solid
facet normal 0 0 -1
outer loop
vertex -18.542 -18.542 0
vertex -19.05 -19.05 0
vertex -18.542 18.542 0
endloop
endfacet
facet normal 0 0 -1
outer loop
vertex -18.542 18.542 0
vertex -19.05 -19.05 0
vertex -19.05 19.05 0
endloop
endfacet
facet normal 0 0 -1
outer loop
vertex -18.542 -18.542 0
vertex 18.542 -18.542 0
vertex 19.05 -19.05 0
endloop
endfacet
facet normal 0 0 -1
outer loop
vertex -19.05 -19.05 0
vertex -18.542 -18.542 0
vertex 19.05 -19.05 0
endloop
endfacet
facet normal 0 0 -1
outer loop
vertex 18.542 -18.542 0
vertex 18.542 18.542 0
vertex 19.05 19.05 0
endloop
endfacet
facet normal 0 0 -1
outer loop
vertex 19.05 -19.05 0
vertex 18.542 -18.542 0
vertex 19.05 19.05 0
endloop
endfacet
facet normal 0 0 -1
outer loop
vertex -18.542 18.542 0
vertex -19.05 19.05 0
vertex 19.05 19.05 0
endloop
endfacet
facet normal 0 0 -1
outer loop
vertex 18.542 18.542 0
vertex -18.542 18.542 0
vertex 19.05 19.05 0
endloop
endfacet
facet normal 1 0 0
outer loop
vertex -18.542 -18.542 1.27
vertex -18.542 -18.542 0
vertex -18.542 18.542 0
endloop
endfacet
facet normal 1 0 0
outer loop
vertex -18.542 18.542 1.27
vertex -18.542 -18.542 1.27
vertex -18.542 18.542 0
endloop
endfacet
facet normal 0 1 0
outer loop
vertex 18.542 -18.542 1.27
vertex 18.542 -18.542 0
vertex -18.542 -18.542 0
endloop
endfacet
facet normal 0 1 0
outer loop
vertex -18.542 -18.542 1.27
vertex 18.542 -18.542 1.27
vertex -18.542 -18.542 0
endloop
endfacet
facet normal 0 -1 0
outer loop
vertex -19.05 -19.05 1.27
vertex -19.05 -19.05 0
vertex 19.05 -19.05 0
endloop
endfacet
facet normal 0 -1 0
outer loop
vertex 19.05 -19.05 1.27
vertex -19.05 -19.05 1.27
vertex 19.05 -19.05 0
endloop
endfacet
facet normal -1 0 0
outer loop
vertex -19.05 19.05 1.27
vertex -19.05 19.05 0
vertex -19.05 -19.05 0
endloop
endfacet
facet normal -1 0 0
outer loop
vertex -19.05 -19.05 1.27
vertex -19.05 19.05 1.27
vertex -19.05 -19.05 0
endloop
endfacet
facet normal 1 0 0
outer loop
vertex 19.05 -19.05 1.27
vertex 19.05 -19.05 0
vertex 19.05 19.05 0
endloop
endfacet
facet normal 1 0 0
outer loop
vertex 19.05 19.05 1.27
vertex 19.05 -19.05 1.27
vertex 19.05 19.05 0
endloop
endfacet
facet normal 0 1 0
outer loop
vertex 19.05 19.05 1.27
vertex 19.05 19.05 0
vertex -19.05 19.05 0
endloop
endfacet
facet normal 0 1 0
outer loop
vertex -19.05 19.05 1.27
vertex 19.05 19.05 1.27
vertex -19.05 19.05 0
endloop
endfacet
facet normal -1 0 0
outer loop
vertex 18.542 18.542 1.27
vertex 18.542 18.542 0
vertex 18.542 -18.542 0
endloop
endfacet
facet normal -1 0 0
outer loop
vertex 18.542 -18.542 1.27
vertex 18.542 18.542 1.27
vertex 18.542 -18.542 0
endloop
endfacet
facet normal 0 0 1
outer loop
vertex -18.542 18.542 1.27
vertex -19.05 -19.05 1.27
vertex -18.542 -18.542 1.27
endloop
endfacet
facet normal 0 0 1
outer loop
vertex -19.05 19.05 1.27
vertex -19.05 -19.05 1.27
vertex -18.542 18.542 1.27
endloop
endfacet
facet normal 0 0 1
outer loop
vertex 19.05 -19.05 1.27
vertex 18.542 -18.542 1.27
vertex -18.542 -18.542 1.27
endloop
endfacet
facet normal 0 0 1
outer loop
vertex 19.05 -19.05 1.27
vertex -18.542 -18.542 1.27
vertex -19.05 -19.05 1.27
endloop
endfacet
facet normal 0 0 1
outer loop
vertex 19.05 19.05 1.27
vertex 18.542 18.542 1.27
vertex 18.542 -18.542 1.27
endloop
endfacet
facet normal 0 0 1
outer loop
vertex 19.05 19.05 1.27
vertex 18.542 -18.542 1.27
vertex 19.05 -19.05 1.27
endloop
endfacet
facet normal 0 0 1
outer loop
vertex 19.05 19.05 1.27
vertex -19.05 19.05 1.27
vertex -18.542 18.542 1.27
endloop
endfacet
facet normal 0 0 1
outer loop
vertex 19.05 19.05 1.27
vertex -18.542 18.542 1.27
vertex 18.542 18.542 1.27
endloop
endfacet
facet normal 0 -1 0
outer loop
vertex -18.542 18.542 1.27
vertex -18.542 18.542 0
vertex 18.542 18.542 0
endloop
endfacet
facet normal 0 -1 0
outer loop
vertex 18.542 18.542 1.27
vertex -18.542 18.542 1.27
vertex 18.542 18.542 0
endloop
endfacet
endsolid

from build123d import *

# Parameters (mm, degrees)
F0_W     = 0.508
F0_H     = 0.508
F1_DEPTH = 1.27
F2_R     = 1.5875
F3_DEPTH = 25.4


with BuildPart() as f1:
    # F0 (on Top) → F1 (new body)
    with BuildSketch(Plane.XY):
        with Locations((18.796, -18.796)):
            Rectangle(F0_W, F0_H)
        with Locations((18.288, -18.796)):
            Rectangle(F0_W, F0_H)
        with Locations((18.796, -18.288)):
            Rectangle(F0_W, F0_H)
        with Locations((17.78, -18.796)):
            Rectangle(F0_W, F0_H)
        with Locations((18.796, -17.78)):
            Rectangle(F0_W, F0_H)
        with Locations((17.272, -18.796)):
            Rectangle(F0_W, F0_H)
        with Locations((18.796, -17.272)):
            Rectangle(F0_W, F0_H)
        with Locations((16.764, -18.796)):
            Rectangle(F0_W, F0_H)
        with Locations((18.796, -16.764)):
            Rectangle(F0_W, F0_H)
        with Locations((16.256, -18.796)):
            Rectangle(F0_W, F0_H)
        with Locations((18.796, -16.256)):
            Rectangle(F0_W, F0_H)
        with Locations((15.748, -18.796)):
            Rectangle(F0_W, F0_H)
        with Locations((18.796, -15.748)):
            Rectangle(F0_W, F0_H)
        with Locations((15.24, -18.796)):
            Rectangle(F0_W, F0_H)
        with Locations((18.796, -15.24)):
            Rectangle(F0_W, F0_H)
        with Locations((14.732, -18.796)):
            Rectangle(F0_W, F0_H)
        with Locations((18.796, -14.732)):
            Rectangle(F0_W, F0_H)
        with Locations((14.224, -18.796)):
            Rectangle(F0_W, F0_H)
        with Locations((18.796, -14.224)):
            Rectangle(F0_W, F0_H)
        with Locations((13.716, -18.796)):
            Rectangle(F0_W, F0_H)
        with Locations((18.796, -13.716)):
            Rectangle(F0_W, F0_H)
        with Locations((13.208, -18.796)):
            Rectangle(F0_W, F0_H)
        with Locations((18.796, -13.208)):
            Rectangle(F0_W, F0_H)
        with Locations((12.7, -18.796)):
            Rectangle(F0_W, F0_H)
        with Locations((18.796, -12.7)):
            Rectangle(F0_W, F0_H)
        with Locations((12.192, -18.796)):
            Rectangle(F0_W, F0_H)
        with Locations((18.796, -12.192)):
            Rectangle(F0_W, F0_H)
        with Locations((11.684, -18.796)):
            Rectangle(F0_W, F0_H)
        with Locations((18.796, -11.684)):
            Rectangle(F0_W, F0_H)
        with Locations((11.176, -18.796)):
            Rectangle(F0_W, F0_H)
        with Locations((18.796, -11.176)):
            Rectangle(F0_W, F0_H)
        with Locations((10.668, -18.796)):
            Rectangle(F0_W, F0_H)
        with Locations((18.796, -10.668)):
            Rectangle(F0_W, F0_H)
        with Locations((10.16, -18.796)):
            Rectangle(F0_W, F0_H)
        with Locations((18.796, -10.16)):
            Rectangle(F0_W, F0_H)
        with Locations((9.652, -18.796)):
            Rectangle(F0_W, F0_H)
        with Locations((18.796, -9.652)):
            Rectangle(F0_W, F0_H)
        with Locations((9.144, -18.796)):
            Rectangle(F0_W, F0_H)
        with Locations((18.796, -9.144)):
            Rectangle(F0_W, F0_H)
        with Locations((8.636, -18.796)):
            Rectangle(F0_W, F0_H)
        with Locations((18.796, -8.636)):
            Rectangle(F0_W, F0_H)
        with Locations((8.128, -18.796)):
            Rectangle(F0_W, F0_H)
        with Locations((18.796, -8.128)):
            Rectangle(F0_W, F0_H)
        with Locations((7.62, -18.796)):
            Rectangle(F0_W, F0_H)
        with Locations((18.796, -7.62)):
            Rectangle(F0_W, F0_H)
        with Locations((7.112, -18.796)):
            Rectangle(F0_W, F0_H)
        with Locations((18.796, -7.112)):
            Rectangle(F0_W, F0_H)
        with Locations((6.604, -18.796)):
            Rectangle(F0_W, F0_H)
        with Locations((18.796, -6.604)):
            Rectangle(F0_W, F0_H)
        with Locations((6.096, -18.796)):
            Rectangle(F0_W, F0_H)
        with Locations((18.796, -6.096)):
            Rectangle(F0_W, F0_H)
        with Locations((5.588, -18.796)):
            Rectangle(F0_W, F0_H)
        with Locations((18.796, -5.588)):
            Rectangle(F0_W, F0_H)
        with Locations((5.08, -18.796)):
            Rectangle(F0_W, F0_H)
        with Locations((18.796, -5.08)):
            Rectangle(F0_W, F0_H)
        with Locations((4.572, -18.796)):
            Rectangle(F0_W, F0_H)
        with Locations((18.796, -4.572)):
            Rectangle(F0_W, F0_H)
        with Locations((4.064, -18.796)):
            Rectangle(F0_W, F0_H)
        with Locations((18.796, -4.064)):
            Rectangle(F0_W, F0_H)
        with Locations((3.556, -18.796)):
            Rectangle(F0_W, F0_H)
        with Locations((18.796, -3.556)):
            Rectangle(F0_W, F0_H)
        with Locations((3.048, -18.796)):
            Rectangle(F0_W, F0_H)
        with Locations((18.796, -3.048)):
            Rectangle(F0_W, F0_H)
        with Locations((2.54, -18.796)):
            Rectangle(F0_W, F0_H)
        with Locations((18.796, -2.54)):
            Rectangle(F0_W, F0_H)
        with Locations((2.032, -18.796)):
            Rectangle(F0_W, F0_H)
        with Locations((18.796, -2.032)):
            Rectangle(F0_W, F0_H)
        with Locations((1.524, -18.796)):
            Rectangle(F0_W, F0_H)
        with Locations((18.796, -1.524)):
            Rectangle(F0_W, F0_H)
        with Locations((1.016, -18.796)):
            Rectangle(F0_W, F0_H)
        with Locations((18.796, -1.016)):
            Rectangle(F0_W, F0_H)
        with Locations((0.508, -18.796)):
            Rectangle(F0_W, F0_H)
        with Locations((18.796, -0.508)):
            Rectangle(F0_W, F0_H)
        with Locations((0, -18.796)):
            Rectangle(F0_W, F0_H)
        with Locations((18.796, 0)):
            Rectangle(F0_W, F0_H)
        with Locations((-0.508, -18.796)):
            Rectangle(F0_W, F0_H)
        with Locations((18.796, 0.508)):
            Rectangle(F0_W, F0_H)
        with Locations((-1.016, -18.796)):
            Rectangle(F0_W, F0_H)
        with Locations((18.796, 1.016)):
            Rectangle(F0_W, F0_H)
        with Locations((-1.524, -18.796)):
            Rectangle(F0_W, F0_H)
        with Locations((18.796, 1.524)):
            Rectangle(F0_W, F0_H)
        with Locations((-2.032, -18.796)):
            Rectangle(F0_W, F0_H)
        with Locations((18.796, 2.032)):
            Rectangle(F0_W, F0_H)
        with Locations((-2.54, -18.796)):
            Rectangle(F0_W, F0_H)
        with Locations((18.796, 2.54)):
            Rectangle(F0_W, F0_H)
        with Locations((-3.048, -18.796)):
            Rectangle(F0_W, F0_H)
        with Locations((18.796, 3.048)):
            Rectangle(F0_W, F0_H)
        with Locations((-3.556, -18.796)):
            Rectangle(F0_W, F0_H)
        with Locations((18.796, 3.556)):
            Rectangle(F0_W, F0_H)
        with Locations((-4.064, -18.796)):
            Rectangle(F0_W, F0_H)
        with Locations((18.796, 4.064)):
            Rectangle(F0_W, F0_H)
        with Locations((-4.572, -18.796)):
            Rectangle(F0_W, F0_H)
        with Locations((18.796, 4.572)):
            Rectangle(F0_W, F0_H)
        with Locations((-5.08, -18.796)):
            Rectangle(F0_W, F0_H)
        with Locations((18.796, 5.08)):
            Rectangle(F0_W, F0_H)
        with Locations((-5.588, -18.796)):
            Rectangle(F0_W, F0_H)
        with Locations((18.796, 5.588)):
            Rectangle(F0_W, F0_H)
        with Locations((-6.096, -18.796)):
            Rectangle(F0_W, F0_H)
        with Locations((18.796, 6.096)):
            Rectangle(F0_W, F0_H)
        with Locations((-6.604, -18.796)):
            Rectangle(F0_W, F0_H)
        with Locations((18.796, 6.604)):
            Rectangle(F0_W, F0_H)
        with Locations((-7.112, -18.796)):
            Rectangle(F0_W, F0_H)
        with Locations((18.796, 7.112)):
            Rectangle(F0_W, F0_H)
        with Locations((-7.62, -18.796)):
            Rectangle(F0_W, F0_H)
        with Locations((18.796, 7.62)):
            Rectangle(F0_W, F0_H)
        with Locations((-8.128, -18.796)):
            Rectangle(F0_W, F0_H)
        with Locations((18.796, 8.128)):
            Rectangle(F0_W, F0_H)
        with Locations((-8.636, -18.796)):
            Rectangle(F0_W, F0_H)
        with Locations((18.796, 8.636)):
            Rectangle(F0_W, F0_H)
        with Locations((-9.144, -18.796)):
            Rectangle(F0_W, F0_H)
        with Locations((18.796, 9.144)):
            Rectangle(F0_W, F0_H)
        with Locations((-9.652, -18.796)):
            Rectangle(F0_W, F0_H)
        with Locations((18.796, 9.652)):
            Rectangle(F0_W, F0_H)
        with Locations((-10.16, -18.796)):
            Rectangle(F0_W, F0_H)
        with Locations((18.796, 10.16)):
            Rectangle(F0_W, F0_H)
        with Locations((-10.668, -18.796)):
            Rectangle(F0_W, F0_H)
        with Locations((18.796, 10.668)):
            Rectangle(F0_W, F0_H)
        with Locations((-11.176, -18.796)):
            Rectangle(F0_W, F0_H)
        with Locations((18.796, 11.176)):
            Rectangle(F0_W, F0_H)
        with Locations((-11.684, -18.796)):
            Rectangle(F0_W, F0_H)
        with Locations((18.796, 11.684)):
            Rectangle(F0_W, F0_H)
        with Locations((-12.192, -18.796)):
            Rectangle(F0_W, F0_H)
        with Locations((18.796, 12.192)):
            Rectangle(F0_W, F0_H)
        with Locations((-12.7, -18.796)):
            Rectangle(F0_W, F0_H)
        with Locations((18.796, 12.7)):
            Rectangle(F0_W, F0_H)
        with Locations((-13.208, -18.796)):
            Rectangle(F0_W, F0_H)
        with Locations((18.796, 13.208)):
            Rectangle(F0_W, F0_H)
        with Locations((-13.716, -18.796)):
            Rectangle(F0_W, F0_H)
        with Locations((18.796, 13.716)):
            Rectangle(F0_W, F0_H)
        with Locations((-14.224, -18.796)):
            Rectangle(F0_W, F0_H)
        with Locations((18.796, 14.224)):
            Rectangle(F0_W, F0_H)
        with Locations((-14.732, -18.796)):
            Rectangle(F0_W, F0_H)
        with Locations((18.796, 14.732)):
            Rectangle(F0_W, F0_H)
        with Locations((-15.24, -18.796)):
            Rectangle(F0_W, F0_H)
        with Locations((18.796, 15.24)):
            Rectangle(F0_W, F0_H)
        with Locations((-15.748, -18.796)):
            Rectangle(F0_W, F0_H)
        with Locations((18.796, 15.748)):
            Rectangle(F0_W, F0_H)
        with Locations((-16.256, -18.796)):
            Rectangle(F0_W, F0_H)
        with Locations((18.796, 16.256)):
            Rectangle(F0_W, F0_H)
        with Locations((-16.764, -18.796)):
            Rectangle(F0_W, F0_H)
        with Locations((18.796, 16.764)):
            Rectangle(F0_W, F0_H)
        with Locations((-17.272, -18.796)):
            Rectangle(F0_W, F0_H)
        with Locations((18.796, 17.272)):
            Rectangle(F0_W, F0_H)
        with Locations((-17.78, -18.796)):
            Rectangle(F0_W, F0_H)
        with Locations((18.796, 17.78)):
            Rectangle(F0_W, F0_H)
        with Locations((-18.288, -18.796)):
            Rectangle(F0_W, F0_H)
        with Locations((18.796, 18.288)):
            Rectangle(F0_W, F0_H)
        with Locations((-18.796, -18.796)):
            Rectangle(F0_W, F0_H)
        with Locations((18.796, 18.796)):
            Rectangle(F0_W, F0_H)
        with Locations((-18.796, -18.288)):
            Rectangle(F0_W, F0_H)
        with Locations((18.288, 18.796)):
            Rectangle(F0_W, F0_H)
        with Locations((-18.796, -17.78)):
            Rectangle(F0_W, F0_H)
        with Locations((17.78, 18.796)):
            Rectangle(F0_W, F0_H)
        with Locations((-18.796, -17.272)):
            Rectangle(F0_W, F0_H)
        with Locations((17.272, 18.796)):
            Rectangle(F0_W, F0_H)
        with Locations((-18.796, -16.764)):
            Rectangle(F0_W, F0_H)
        with Locations((16.764, 18.796)):
            Rectangle(F0_W, F0_H)
        with Locations((-18.796, -16.256)):
            Rectangle(F0_W, F0_H)
        with Locations((16.256, 18.796)):
            Rectangle(F0_W, F0_H)
        with Locations((-18.796, -15.748)):
            Rectangle(F0_W, F0_H)
        with Locations((15.748, 18.796)):
            Rectangle(F0_W, F0_H)
        with Locations((-18.796, -15.24)):
            Rectangle(F0_W, F0_H)
        with Locations((15.24, 18.796)):
            Rectangle(F0_W, F0_H)
        with Locations((-18.796, -14.732)):
            Rectangle(F0_W, F0_H)
        with Locations((14.732, 18.796)):
            Rectangle(F0_W, F0_H)
        with Locations((-18.796, -14.224)):
            Rectangle(F0_W, F0_H)
        with Locations((14.224, 18.796)):
            Rectangle(F0_W, F0_H)
        with Locations((-18.796, -13.716)):
            Rectangle(F0_W, F0_H)
        with Locations((13.716, 18.796)):
            Rectangle(F0_W, F0_H)
        with Locations((-18.796, -13.208)):
            Rectangle(F0_W, F0_H)
        with Locations((13.208, 18.796)):
            Rectangle(F0_W, F0_H)
        with Locations((-18.796, -12.7)):
            Rectangle(F0_W, F0_H)
        with Locations((12.7, 18.796)):
            Rectangle(F0_W, F0_H)
        with Locations((-18.796, -12.192)):
            Rectangle(F0_W, F0_H)
        with Locations((12.192, 18.796)):
            Rectangle(F0_W, F0_H)
        with Locations((-18.796, -11.684)):
            Rectangle(F0_W, F0_H)
        with Locations((11.684, 18.796)):
            Rectangle(F0_W, F0_H)
        with Locations((-18.796, -11.176)):
            Rectangle(F0_W, F0_H)
        with Locations((11.176, 18.796)):
            Rectangle(F0_W, F0_H)
        with Locations((-18.796, -10.668)):
            Rectangle(F0_W, F0_H)
        with Locations((10.668, 18.796)):
            Rectangle(F0_W, F0_H)
        with Locations((-18.796, -10.16)):
            Rectangle(F0_W, F0_H)
        with Locations((10.16, 18.796)):
            Rectangle(F0_W, F0_H)
        with Locations((-18.796, -9.652)):
            Rectangle(F0_W, F0_H)
        with Locations((9.652, 18.796)):
            Rectangle(F0_W, F0_H)
        with Locations((-18.796, -9.144)):
            Rectangle(F0_W, F0_H)
        with Locations((9.144, 18.796)):
            Rectangle(F0_W, F0_H)
        with Locations((-18.796, -8.636)):
            Rectangle(F0_W, F0_H)
        with Locations((8.636, 18.796)):
            Rectangle(F0_W, F0_H)
        with Locations((-18.796, -8.128)):
            Rectangle(F0_W, F0_H)
        with Locations((8.128, 18.796)):
            Rectangle(F0_W, F0_H)
        with Locations((-18.796, -7.62)):
            Rectangle(F0_W, F0_H)
        with Locations((7.62, 18.796)):
            Rectangle(F0_W, F0_H)
        with Locations((-18.796, -7.112)):
            Rectangle(F0_W, F0_H)
        with Locations((7.112, 18.796)):
            Rectangle(F0_W, F0_H)
        with Locations((-18.796, -6.604)):
            Rectangle(F0_W, F0_H)
        with Locations((6.604, 18.796)):
            Rectangle(F0_W, F0_H)
        with Locations((-18.796, -6.096)):
            Rectangle(F0_W, F0_H)
        with Locations((6.096, 18.796)):
            Rectangle(F0_W, F0_H)
        with Locations((-18.796, -5.588)):
            Rectangle(F0_W, F0_H)
        with Locations((5.588, 18.796)):
            Rectangle(F0_W, F0_H)
        with Locations((-18.796, -5.08)):
            Rectangle(F0_W, F0_H)
        with Locations((5.08, 18.796)):
            Rectangle(F0_W, F0_H)
        with Locations((-18.796, -4.572)):
            Rectangle(F0_W, F0_H)
        with Locations((4.572, 18.796)):
            Rectangle(F0_W, F0_H)
        with Locations((-18.796, -4.064)):
            Rectangle(F0_W, F0_H)
        with Locations((4.064, 18.796)):
            Rectangle(F0_W, F0_H)
        with Locations((-18.796, -3.556)):
            Rectangle(F0_W, F0_H)
        with Locations((3.556, 18.796)):
            Rectangle(F0_W, F0_H)
        with Locations((-18.796, -3.048)):
            Rectangle(F0_W, F0_H)
        with Locations((3.048, 18.796)):
            Rectangle(F0_W, F0_H)
        with Locations((-18.796, -2.54)):
            Rectangle(F0_W, F0_H)
        with Locations((2.54, 18.796)):
            Rectangle(F0_W, F0_H)
        with Locations((-18.796, -2.032)):
            Rectangle(F0_W, F0_H)
        with Locations((2.032, 18.796)):
            Rectangle(F0_W, F0_H)
        with Locations((-18.796, -1.524)):
            Rectangle(F0_W, F0_H)
        with Locations((1.524, 18.796)):
            Rectangle(F0_W, F0_H)
        with Locations((-18.796, -1.016)):
            Rectangle(F0_W, F0_H)
        with Locations((1.016, 18.796)):
            Rectangle(F0_W, F0_H)
        with Locations((-18.796, -0.508)):
            Rectangle(F0_W, F0_H)
        with Locations((0.508, 18.796)):
            Rectangle(F0_W, F0_H)
        with Locations((-18.796, 0)):
            Rectangle(F0_W, F0_H)
        with Locations((0, 18.796)):
            Rectangle(F0_W, F0_H)
        with Locations((-18.796, 0.508)):
            Rectangle(F0_W, F0_H)
        with Locations((-0.508, 18.796)):
            Rectangle(F0_W, F0_H)
        with Locations((-18.796, 1.016)):
            Rectangle(F0_W, F0_H)
        with Locations((-1.016, 18.796)):
            Rectangle(F0_W, F0_H)
        with Locations((-18.796, 1.524)):
            Rectangle(F0_W, F0_H)
        with Locations((-1.524, 18.796)):
            Rectangle(F0_W, F0_H)
        with Locations((-18.796, 2.032)):
            Rectangle(F0_W, F0_H)
        with Locations((-2.032, 18.796)):
            Rectangle(F0_W, F0_H)
        with Locations((-18.796, 2.54)):
            Rectangle(F0_W, F0_H)
        with Locations((-2.54, 18.796)):
            Rectangle(F0_W, F0_H)
        with Locations((-18.796, 3.048)):
            Rectangle(F0_W, F0_H)
        with Locations((-3.048, 18.796)):
            Rectangle(F0_W, F0_H)
        with Locations((-18.796, 3.556)):
            Rectangle(F0_W, F0_H)
        with Locations((-3.556, 18.796)):
            Rectangle(F0_W, F0_H)
        with Locations((-18.796, 4.064)):
            Rectangle(F0_W, F0_H)
        with Locations((-4.064, 18.796)):
            Rectangle(F0_W, F0_H)
        with Locations((-18.796, 4.572)):
            Rectangle(F0_W, F0_H)
        with Locations((-4.572, 18.796)):
            Rectangle(F0_W, F0_H)
        with Locations((-18.796, 5.08)):
            Rectangle(F0_W, F0_H)
        with Locations((-5.08, 18.796)):
            Rectangle(F0_W, F0_H)
        with Locations((-18.796, 5.588)):
            Rectangle(F0_W, F0_H)
        with Locations((-5.588, 18.796)):
            Rectangle(F0_W, F0_H)
        with Locations((-18.796, 6.096)):
            Rectangle(F0_W, F0_H)
        with Locations((-6.096, 18.796)):
            Rectangle(F0_W, F0_H)
        with Locations((-18.796, 6.604)):
            Rectangle(F0_W, F0_H)
        with Locations((-6.604, 18.796)):
            Rectangle(F0_W, F0_H)
        with Locations((-18.796, 7.112)):
            Rectangle(F0_W, F0_H)
        with Locations((-7.112, 18.796)):
            Rectangle(F0_W, F0_H)
        with Locations((-18.796, 7.62)):
            Rectangle(F0_W, F0_H)
        with Locations((-7.62, 18.796)):
            Rectangle(F0_W, F0_H)
        with Locations((-18.796, 8.128)):
            Rectangle(F0_W, F0_H)
        with Locations((-8.128, 18.796)):
            Rectangle(F0_W, F0_H)
        with Locations((-18.796, 8.636)):
            Rectangle(F0_W, F0_H)
        with Locations((-8.636, 18.796)):
            Rectangle(F0_W, F0_H)
        with Locations((-18.796, 9.144)):
            Rectangle(F0_W, F0_H)
        with Locations((-9.144, 18.796)):
            Rectangle(F0_W, F0_H)
        with Locations((-18.796, 9.652)):
            Rectangle(F0_W, F0_H)
        with Locations((-9.652, 18.796)):
            Rectangle(F0_W, F0_H)
        with Locations((-18.796, 10.16)):
            Rectangle(F0_W, F0_H)
        with Locations((-10.16, 18.796)):
            Rectangle(F0_W, F0_H)
        with Locations((-18.796, 10.668)):
            Rectangle(F0_W, F0_H)
        with Locations((-10.668, 18.796)):
            Rectangle(F0_W, F0_H)
        with Locations((-18.796, 11.176)):
            Rectangle(F0_W, F0_H)
        with Locations((-11.176, 18.796)):
            Rectangle(F0_W, F0_H)
        with Locations((-18.796, 11.684)):
            Rectangle(F0_W, F0_H)
        with Locations((-11.684, 18.796)):
            Rectangle(F0_W, F0_H)
        with Locations((-18.796, 12.192)):
            Rectangle(F0_W, F0_H)
        with Locations((-12.192, 18.796)):
            Rectangle(F0_W, F0_H)
        with Locations((-18.796, 12.7)):
            Rectangle(F0_W, F0_H)
        with Locations((-12.7, 18.796)):
            Rectangle(F0_W, F0_H)
        with Locations((-18.796, 13.208)):
            Rectangle(F0_W, F0_H)
        with Locations((-13.208, 18.796)):
            Rectangle(F0_W, F0_H)
        with Locations((-18.796, 13.716)):
            Rectangle(F0_W, F0_H)
        with Locations((-13.716, 18.796)):
            Rectangle(F0_W, F0_H)
        with Locations((-18.796, 14.224)):
            Rectangle(F0_W, F0_H)
        with Locations((-14.224, 18.796)):
            Rectangle(F0_W, F0_H)
        with Locations((-18.796, 14.732)):
            Rectangle(F0_W, F0_H)
        with Locations((-14.732, 18.796)):
            Rectangle(F0_W, F0_H)
        with Locations((-18.796, 15.24)):
            Rectangle(F0_W, F0_H)
        with Locations((-15.24, 18.796)):
            Rectangle(F0_W, F0_H)
        with Locations((-18.796, 15.748)):
            Rectangle(F0_W, F0_H)
        with Locations((-15.748, 18.796)):
            Rectangle(F0_W, F0_H)
        with Locations((-18.796, 16.256)):
            Rectangle(F0_W, F0_H)
        with Locations((-16.256, 18.796)):
            Rectangle(F0_W, F0_H)
        with Locations((-18.796, 16.764)):
            Rectangle(F0_W, F0_H)
        with Locations((-16.764, 18.796)):
            Rectangle(F0_W, F0_H)
        with Locations((-18.796, 17.272)):
            Rectangle(F0_W, F0_H)
        with Locations((-17.272, 18.796)):
            Rectangle(F0_W, F0_H)
        with Locations((-18.796, 17.78)):
            Rectangle(F0_W, F0_H)
        with Locations((-17.78, 18.796)):
            Rectangle(F0_W, F0_H)
        with Locations((-18.796, 18.288)):
            Rectangle(F0_W, F0_H)
        with Locations((-18.288, 18.796)):
            Rectangle(F0_W, F0_H)
        with Locations((-18.796, 18.796)):
            Rectangle(F0_W, F0_H)
    extrude(amount=F1_DEPTH)

    # F2 (on Top) → F3 (cut)
    with BuildSketch(Plane.XY):
        with Locations((13.97, 13.97)):
            Circle(F2_R)
    extrude(amount=F3_DEPTH, mode=Mode.SUBTRACT)

    # F4: F1 across plane


with BuildPart() as f1_1:
    add(f1.part)
    add(f1.part.mirror(Plane.YZ), mode=Mode.INTERSECT)

    # F5: F1 across plane


with BuildPart() as f1_2:
    add(f1_1.part)
    add(f1_1.part.mirror(Plane.XZ), mode=Mode.INTERSECT)


solid = f1_2.part
